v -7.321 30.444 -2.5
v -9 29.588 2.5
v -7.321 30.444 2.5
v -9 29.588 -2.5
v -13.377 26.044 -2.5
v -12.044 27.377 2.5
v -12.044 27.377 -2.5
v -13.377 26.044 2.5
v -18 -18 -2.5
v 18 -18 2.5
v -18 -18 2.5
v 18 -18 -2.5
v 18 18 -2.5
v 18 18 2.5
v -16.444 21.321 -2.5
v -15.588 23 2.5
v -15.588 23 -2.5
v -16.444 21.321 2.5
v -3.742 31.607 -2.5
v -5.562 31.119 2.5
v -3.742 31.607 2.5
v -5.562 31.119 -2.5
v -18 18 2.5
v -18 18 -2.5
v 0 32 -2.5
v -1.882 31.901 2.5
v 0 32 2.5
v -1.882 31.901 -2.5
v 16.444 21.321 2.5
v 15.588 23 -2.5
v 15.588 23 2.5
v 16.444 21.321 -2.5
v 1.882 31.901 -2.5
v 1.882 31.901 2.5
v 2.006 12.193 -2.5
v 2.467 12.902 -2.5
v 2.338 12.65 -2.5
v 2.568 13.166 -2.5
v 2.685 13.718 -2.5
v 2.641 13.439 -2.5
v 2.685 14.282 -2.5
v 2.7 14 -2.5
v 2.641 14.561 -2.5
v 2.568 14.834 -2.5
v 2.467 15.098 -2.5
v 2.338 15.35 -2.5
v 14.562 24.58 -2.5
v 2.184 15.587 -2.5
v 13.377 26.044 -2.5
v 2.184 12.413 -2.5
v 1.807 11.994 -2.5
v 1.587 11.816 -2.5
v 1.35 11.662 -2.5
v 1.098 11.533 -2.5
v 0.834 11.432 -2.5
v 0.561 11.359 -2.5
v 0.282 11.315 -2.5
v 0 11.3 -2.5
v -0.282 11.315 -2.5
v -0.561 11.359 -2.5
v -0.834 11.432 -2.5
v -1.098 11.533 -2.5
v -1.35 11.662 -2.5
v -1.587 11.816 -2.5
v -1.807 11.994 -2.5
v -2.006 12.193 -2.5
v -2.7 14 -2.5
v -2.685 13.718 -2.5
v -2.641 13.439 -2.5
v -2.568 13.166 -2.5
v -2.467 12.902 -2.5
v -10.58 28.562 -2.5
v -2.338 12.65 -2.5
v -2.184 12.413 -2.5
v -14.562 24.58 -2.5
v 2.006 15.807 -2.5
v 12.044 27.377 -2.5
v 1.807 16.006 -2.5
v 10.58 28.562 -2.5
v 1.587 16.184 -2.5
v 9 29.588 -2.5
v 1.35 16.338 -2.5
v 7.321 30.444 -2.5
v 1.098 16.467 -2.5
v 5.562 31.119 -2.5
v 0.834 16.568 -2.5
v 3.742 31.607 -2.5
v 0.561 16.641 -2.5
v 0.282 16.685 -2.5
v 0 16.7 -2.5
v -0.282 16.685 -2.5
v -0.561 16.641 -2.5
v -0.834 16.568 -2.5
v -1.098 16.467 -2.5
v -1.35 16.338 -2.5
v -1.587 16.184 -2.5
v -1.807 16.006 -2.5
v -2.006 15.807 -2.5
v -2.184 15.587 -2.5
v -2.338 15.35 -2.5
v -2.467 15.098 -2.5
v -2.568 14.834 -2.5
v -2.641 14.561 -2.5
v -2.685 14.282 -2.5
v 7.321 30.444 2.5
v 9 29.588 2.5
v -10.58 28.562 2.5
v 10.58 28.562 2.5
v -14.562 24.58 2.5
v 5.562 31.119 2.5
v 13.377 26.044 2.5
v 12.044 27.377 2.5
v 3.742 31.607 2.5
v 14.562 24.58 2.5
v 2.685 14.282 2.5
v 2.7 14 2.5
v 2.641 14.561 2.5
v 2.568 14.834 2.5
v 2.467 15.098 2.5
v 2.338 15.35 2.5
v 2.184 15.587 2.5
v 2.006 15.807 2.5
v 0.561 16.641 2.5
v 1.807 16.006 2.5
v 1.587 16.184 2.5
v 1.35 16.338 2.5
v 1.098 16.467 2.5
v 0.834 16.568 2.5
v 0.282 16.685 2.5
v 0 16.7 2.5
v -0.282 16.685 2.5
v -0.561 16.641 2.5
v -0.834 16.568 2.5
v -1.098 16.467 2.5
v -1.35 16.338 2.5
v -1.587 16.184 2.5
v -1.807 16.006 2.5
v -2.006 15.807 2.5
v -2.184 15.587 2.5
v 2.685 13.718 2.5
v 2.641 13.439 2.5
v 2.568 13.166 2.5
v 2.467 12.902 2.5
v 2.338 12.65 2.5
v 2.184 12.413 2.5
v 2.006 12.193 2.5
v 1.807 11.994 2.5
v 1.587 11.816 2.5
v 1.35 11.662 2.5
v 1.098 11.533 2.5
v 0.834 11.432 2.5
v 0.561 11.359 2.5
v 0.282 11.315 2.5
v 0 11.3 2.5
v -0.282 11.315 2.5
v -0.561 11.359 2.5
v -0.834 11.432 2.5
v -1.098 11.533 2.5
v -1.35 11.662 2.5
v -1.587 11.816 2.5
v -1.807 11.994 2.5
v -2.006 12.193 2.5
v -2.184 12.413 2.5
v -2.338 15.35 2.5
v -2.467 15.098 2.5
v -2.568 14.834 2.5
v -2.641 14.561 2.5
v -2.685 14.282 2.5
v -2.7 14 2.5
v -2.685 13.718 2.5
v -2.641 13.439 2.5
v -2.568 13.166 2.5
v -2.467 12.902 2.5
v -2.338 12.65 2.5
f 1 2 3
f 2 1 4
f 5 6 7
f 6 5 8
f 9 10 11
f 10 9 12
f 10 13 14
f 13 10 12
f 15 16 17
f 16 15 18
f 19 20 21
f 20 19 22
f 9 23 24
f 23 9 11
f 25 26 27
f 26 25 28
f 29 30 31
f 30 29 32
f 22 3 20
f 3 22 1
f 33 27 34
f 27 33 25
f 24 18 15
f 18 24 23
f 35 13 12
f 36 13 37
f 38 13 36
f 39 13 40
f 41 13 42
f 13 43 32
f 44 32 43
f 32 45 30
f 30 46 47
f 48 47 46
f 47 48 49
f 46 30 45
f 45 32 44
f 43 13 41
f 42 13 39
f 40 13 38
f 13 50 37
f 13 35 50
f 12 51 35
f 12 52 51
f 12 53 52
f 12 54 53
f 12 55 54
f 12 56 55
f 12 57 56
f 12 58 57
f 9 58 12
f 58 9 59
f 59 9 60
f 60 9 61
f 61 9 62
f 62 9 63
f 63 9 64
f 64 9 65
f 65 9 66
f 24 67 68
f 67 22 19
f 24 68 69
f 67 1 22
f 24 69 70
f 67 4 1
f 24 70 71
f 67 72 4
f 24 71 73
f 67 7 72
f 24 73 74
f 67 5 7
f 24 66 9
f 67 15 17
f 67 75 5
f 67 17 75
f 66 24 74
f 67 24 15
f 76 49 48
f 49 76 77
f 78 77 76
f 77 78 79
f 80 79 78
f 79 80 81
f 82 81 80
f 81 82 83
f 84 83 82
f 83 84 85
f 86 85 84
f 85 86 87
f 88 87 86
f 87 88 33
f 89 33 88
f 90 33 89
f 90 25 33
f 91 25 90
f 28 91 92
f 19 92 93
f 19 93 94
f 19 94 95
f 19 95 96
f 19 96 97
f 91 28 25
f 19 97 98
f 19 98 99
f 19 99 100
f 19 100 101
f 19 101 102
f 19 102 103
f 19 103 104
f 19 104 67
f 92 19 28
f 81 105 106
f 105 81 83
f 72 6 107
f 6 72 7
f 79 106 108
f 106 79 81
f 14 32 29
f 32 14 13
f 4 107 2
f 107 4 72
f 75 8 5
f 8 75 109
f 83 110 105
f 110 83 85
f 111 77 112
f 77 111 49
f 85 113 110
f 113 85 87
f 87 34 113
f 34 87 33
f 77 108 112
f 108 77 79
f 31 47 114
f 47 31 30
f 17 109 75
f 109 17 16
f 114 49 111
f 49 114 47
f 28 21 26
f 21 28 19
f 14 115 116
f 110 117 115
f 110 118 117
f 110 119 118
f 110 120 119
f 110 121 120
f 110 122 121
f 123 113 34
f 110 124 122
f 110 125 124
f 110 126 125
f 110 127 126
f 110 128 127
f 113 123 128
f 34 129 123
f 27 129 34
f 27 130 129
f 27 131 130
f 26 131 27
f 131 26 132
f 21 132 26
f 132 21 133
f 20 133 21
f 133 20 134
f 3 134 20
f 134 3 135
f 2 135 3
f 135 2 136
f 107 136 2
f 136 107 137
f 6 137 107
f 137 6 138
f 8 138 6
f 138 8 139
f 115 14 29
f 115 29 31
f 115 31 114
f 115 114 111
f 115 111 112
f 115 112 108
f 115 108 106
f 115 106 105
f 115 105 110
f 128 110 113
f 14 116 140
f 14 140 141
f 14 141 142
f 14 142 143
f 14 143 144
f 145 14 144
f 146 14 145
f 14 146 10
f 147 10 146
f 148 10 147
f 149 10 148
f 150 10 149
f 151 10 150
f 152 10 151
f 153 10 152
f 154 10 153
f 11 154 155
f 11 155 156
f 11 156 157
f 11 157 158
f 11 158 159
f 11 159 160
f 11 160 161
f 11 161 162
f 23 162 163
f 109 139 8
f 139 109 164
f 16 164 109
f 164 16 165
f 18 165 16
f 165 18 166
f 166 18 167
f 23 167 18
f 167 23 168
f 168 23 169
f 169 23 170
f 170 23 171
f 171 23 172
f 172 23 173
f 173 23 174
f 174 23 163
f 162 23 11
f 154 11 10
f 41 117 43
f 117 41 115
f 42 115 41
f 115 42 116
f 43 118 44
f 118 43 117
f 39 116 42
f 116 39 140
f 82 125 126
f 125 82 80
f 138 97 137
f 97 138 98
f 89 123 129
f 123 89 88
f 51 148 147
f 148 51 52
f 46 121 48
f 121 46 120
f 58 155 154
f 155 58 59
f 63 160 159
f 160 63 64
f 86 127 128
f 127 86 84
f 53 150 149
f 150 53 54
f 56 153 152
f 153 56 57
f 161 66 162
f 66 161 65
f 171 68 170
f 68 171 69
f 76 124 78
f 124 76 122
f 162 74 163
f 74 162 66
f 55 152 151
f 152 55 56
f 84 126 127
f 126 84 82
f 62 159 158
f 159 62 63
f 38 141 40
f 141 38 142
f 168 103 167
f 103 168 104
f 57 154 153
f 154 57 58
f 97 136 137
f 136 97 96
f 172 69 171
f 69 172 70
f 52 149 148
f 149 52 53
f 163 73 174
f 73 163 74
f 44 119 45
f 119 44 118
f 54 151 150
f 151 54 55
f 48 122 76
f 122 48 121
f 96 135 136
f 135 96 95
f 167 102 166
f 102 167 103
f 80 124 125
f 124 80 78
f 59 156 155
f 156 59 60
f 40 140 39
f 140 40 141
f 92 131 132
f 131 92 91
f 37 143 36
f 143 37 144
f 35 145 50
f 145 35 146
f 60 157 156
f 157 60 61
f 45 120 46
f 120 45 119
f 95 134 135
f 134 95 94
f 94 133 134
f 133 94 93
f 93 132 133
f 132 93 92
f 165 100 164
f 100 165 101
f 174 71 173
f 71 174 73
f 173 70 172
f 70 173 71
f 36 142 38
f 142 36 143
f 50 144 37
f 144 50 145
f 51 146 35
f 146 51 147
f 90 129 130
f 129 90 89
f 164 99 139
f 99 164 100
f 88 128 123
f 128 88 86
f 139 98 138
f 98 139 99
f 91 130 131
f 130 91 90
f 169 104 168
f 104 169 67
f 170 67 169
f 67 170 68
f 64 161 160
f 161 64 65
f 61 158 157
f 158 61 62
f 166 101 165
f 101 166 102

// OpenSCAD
// Single-hole mounting tab.
$fn = 60;
eps = 0.02;
tab_w = 36;
tab_h = 64;
tab_t = 5;
difference() {
    hull() { translate([0,0,0]) cube([tab_w,tab_w,tab_t],center=true); translate([0,tab_h/2-tab_w/2,0]) cylinder(d=tab_w,h=tab_t,center=true); }
    translate([0,tab_h/2-tab_w/2,-tab_t/2-eps]) cylinder(d=5.4,h=tab_t+2*eps);
}
